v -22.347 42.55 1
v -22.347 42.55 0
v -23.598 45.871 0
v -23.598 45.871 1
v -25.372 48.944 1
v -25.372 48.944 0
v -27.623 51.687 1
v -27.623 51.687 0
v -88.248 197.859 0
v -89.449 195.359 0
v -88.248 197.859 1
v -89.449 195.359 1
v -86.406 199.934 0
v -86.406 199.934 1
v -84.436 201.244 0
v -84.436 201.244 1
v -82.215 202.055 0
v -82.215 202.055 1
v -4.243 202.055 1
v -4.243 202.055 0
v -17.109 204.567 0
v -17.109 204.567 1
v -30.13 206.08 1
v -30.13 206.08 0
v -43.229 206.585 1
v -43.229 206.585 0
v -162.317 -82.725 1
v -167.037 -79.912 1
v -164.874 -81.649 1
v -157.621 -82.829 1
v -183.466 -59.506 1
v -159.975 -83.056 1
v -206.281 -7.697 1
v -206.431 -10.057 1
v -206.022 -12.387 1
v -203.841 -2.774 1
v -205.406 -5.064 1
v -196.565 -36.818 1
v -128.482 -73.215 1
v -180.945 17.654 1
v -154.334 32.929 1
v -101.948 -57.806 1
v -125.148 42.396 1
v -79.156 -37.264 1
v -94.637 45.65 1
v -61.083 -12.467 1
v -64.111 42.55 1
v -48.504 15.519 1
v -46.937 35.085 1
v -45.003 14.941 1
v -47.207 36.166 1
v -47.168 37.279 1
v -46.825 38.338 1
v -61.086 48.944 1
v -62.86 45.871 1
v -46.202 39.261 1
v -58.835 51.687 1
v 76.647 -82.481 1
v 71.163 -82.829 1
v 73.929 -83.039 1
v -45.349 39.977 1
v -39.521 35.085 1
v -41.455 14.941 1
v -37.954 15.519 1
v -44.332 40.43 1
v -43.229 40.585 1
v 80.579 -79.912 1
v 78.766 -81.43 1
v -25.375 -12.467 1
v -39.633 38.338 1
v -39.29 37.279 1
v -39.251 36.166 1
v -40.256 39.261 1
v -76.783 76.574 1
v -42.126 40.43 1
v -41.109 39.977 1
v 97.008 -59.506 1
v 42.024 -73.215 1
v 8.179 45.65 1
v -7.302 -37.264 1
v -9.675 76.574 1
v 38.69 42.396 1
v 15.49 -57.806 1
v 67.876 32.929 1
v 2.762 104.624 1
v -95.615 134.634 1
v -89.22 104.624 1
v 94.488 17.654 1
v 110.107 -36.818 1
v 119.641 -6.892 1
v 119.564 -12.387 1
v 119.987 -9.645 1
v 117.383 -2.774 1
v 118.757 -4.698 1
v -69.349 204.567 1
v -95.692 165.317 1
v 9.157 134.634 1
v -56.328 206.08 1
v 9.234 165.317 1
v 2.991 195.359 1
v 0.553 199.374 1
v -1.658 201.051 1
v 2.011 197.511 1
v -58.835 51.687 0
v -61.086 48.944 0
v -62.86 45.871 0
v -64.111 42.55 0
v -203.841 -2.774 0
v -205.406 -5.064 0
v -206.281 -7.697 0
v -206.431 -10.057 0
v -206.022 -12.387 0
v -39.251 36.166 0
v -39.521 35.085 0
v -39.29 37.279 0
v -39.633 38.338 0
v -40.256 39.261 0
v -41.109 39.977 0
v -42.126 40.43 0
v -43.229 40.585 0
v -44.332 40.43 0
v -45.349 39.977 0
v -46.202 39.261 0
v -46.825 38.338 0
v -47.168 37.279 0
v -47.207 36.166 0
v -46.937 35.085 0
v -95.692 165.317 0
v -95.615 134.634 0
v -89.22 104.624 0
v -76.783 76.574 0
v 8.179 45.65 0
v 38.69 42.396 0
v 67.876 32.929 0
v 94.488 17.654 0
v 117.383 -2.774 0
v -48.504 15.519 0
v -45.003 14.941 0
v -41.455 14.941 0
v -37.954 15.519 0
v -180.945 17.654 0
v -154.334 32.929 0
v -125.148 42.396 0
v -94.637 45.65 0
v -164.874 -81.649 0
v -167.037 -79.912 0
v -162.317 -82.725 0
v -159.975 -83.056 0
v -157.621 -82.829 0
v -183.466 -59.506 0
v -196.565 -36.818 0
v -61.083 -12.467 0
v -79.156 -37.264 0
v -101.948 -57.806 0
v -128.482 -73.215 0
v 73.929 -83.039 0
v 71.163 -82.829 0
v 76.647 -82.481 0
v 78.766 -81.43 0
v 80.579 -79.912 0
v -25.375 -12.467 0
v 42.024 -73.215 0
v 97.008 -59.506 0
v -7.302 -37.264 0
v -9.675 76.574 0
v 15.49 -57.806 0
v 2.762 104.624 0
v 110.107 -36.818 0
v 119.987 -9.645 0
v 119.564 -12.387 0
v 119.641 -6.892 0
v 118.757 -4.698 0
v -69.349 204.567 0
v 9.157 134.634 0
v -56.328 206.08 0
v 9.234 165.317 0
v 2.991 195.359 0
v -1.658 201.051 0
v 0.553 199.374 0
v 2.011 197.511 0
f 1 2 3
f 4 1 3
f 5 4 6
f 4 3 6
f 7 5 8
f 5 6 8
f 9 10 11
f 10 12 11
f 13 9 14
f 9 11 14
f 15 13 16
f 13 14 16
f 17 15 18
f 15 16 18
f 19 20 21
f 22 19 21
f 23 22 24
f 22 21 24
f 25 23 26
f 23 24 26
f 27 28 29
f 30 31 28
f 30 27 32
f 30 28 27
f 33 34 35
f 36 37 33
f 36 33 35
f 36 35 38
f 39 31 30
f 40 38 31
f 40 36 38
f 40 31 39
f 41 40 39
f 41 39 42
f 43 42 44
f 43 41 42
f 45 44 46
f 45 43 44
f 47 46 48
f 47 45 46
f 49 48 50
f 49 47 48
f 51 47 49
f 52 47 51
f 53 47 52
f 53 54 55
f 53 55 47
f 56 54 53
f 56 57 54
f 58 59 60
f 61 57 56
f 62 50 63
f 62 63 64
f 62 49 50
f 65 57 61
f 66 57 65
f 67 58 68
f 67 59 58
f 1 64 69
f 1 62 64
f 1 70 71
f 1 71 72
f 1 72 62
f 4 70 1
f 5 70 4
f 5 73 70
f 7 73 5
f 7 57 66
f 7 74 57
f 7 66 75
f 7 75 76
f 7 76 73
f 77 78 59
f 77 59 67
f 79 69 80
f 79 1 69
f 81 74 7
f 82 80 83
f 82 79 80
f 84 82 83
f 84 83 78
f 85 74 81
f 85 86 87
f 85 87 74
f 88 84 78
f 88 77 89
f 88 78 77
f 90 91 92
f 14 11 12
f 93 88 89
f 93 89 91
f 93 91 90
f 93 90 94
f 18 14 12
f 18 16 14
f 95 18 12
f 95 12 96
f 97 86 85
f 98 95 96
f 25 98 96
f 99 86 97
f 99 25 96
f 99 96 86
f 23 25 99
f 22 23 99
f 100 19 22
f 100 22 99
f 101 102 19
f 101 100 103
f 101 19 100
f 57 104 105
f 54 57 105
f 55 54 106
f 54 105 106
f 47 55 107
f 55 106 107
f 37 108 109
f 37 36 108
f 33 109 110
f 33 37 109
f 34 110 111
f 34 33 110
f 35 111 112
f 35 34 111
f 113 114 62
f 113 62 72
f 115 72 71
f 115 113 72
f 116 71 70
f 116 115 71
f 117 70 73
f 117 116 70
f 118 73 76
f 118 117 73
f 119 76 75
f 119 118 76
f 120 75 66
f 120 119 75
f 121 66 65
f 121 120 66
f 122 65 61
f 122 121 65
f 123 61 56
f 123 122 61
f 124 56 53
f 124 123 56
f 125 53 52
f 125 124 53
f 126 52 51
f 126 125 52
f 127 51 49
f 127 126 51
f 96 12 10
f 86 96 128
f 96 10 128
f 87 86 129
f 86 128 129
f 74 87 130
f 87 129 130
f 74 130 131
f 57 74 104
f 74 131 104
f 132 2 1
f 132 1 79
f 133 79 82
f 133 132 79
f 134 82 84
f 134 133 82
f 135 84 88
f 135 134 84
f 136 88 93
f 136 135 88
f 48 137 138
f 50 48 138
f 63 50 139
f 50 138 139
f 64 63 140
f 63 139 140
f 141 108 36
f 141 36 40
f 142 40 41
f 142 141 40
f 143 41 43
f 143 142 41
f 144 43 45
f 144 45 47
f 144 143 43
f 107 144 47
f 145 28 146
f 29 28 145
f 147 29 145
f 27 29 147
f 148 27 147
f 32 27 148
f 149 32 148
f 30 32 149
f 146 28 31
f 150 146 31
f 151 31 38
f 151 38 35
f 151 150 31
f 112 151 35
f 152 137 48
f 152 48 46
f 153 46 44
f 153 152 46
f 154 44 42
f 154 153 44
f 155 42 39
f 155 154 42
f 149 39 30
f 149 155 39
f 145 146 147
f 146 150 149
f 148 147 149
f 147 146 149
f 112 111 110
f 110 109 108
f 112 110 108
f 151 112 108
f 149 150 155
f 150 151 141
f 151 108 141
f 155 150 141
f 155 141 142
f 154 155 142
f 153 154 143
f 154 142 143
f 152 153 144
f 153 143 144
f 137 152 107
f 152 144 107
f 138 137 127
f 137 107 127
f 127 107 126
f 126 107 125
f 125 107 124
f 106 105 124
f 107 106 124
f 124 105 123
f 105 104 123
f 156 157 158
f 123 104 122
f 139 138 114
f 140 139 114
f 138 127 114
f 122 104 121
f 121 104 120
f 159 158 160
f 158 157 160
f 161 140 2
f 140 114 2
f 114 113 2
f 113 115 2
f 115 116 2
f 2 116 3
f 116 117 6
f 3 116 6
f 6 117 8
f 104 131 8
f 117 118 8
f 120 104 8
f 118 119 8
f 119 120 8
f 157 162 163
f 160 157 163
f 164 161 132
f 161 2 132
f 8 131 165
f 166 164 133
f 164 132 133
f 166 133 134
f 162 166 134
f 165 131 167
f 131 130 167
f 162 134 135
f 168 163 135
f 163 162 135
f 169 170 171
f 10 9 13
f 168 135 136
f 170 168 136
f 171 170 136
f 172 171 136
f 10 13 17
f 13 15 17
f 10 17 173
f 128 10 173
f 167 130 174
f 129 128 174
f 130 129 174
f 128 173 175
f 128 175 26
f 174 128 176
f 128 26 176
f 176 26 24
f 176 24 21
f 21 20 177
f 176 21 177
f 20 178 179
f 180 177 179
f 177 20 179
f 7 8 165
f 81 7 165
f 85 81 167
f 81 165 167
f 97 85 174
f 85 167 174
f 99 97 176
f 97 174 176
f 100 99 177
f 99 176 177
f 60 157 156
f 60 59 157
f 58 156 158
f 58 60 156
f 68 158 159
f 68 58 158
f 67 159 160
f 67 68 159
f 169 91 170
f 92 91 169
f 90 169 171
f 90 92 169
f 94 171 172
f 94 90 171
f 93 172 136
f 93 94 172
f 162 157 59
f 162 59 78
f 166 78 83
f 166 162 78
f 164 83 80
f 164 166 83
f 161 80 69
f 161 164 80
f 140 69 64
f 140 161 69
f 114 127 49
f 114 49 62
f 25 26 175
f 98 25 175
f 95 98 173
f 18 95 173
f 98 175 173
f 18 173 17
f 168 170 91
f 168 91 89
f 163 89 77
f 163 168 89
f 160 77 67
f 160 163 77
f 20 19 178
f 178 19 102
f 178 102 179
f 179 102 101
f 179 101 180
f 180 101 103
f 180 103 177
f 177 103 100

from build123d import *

# Parameters (mm, degrees)
ESQUISSE2_R             = 21.716757685
BOSS_EXTRU_1_DEPTH      = 1
ENL_V_MAT_EXTRU_2_DEPTH = 293.837814183
CONG_2_R                = 10


with BuildPart() as part:
    # Esquisse2 → Boss.-Extru.1 (new body)
    with BuildSketch(Plane.XY):
        with Locations((-43.22899501, 36.585487108)):
            Circle(ESQUISSE2_R)
        with BuildLine():
            ThreePointArc((-207.546192285, -7.001881243), (-132.259115873, 40.696309579), (-43.22899501, 36.585487108))
            ThreePointArc((-43.22899501, 36.585487108), (-84.183978752, -42.572270496), (-163.135361924, -83.923695834))
            ThreePointArc((-163.135361924, -83.923695834), (-190.453313653, -48.414512892), (-207.546192285, -7.001881243))
        make_face()
        with BuildLine():
            ThreePointArc((76.677371904, -83.923695834), (-2.274011269, -42.572270496), (-43.22899501, 36.585487108))
            ThreePointArc((-43.22899501, 36.585487108), (45.801125853, 40.696309579), (121.088202265, -7.001881243))
            ThreePointArc((121.088202265, -7.001881243), (103.995323633, -48.414512892), (76.677371904, -83.923695834))
        make_face()
        with BuildLine():
            Line((-43.22899501, 206.585487108), (-43.22899501, 58.302244794))
            ThreePointArc((-43.22899501, 58.302244794), (-34.753748483, 56.580180421), (-27.622617897, 51.687094896))
            ThreePointArc((-27.622617897, 51.687094896), (7.298277527, 122.217794206), (1.181835351, 200.682038403))
            ThreePointArc((1.181835351, 200.682038403), (-20.82825529, 205.103162324), (-43.22899501, 206.585487108))
        make_face()
        with BuildLine():
            ThreePointArc((-58.835372123, 51.687094896), (-51.704241537, 56.580180421), (-43.22899501, 58.302244794))
            Line((-43.22899501, 58.302244794), (-43.22899501, 206.585487108))
            ThreePointArc((-43.22899501, 206.585487108), (-65.62973473, 205.103162324), (-87.639825371, 200.682038403))
            ThreePointArc((-87.639825371, 200.682038403), (-93.756267547, 122.217794206), (-58.835372123, 51.687094896))
        make_face()
        with BuildLine():
            ThreePointArc((-48.504182436, 15.519164174), (-45.480177087, 25.955564863), (-43.22899501, 36.585487108))
            ThreePointArc((-43.22899501, 36.585487108), (-53.560368754, 39.950867364), (-64.110559549, 42.550202255))
            ThreePointArc((-64.110559549, 42.550202255), (-62.036258854, 25.727108266), (-48.504182436, 15.519164174))
        make_face()
        with BuildLine():
            ThreePointArc((-22.347430471, 42.550202255), (-32.897621267, 39.950867364), (-43.22899501, 36.585487108))
            ThreePointArc((-43.22899501, 36.585487108), (-40.977812933, 25.955564863), (-37.953807584, 15.519164174))
            ThreePointArc((-37.953807584, 15.519164174), (-26.109159563, 23.224020174), (-21.512237325, 36.585487108))
            ThreePointArc((-21.512237325, 36.585487108), (-21.722049137, 39.596939182), (-22.347430471, 42.550202255))
        make_face()
        with BuildLine():
            ThreePointArc((-37.953807584, 15.519164174), (-40.977812933, 25.955564863), (-43.22899501, 36.585487108))
            ThreePointArc((-43.22899501, 36.585487108), (-45.480177087, 25.955564863), (-48.504182436, 15.519164174))
            ThreePointArc((-48.504182436, 15.519164174), (-43.22899501, 14.868729423), (-37.953807584, 15.519164174))
        make_face()
        with BuildLine():
            ThreePointArc((-64.110559549, 42.550202255), (-53.560368754, 39.950867364), (-43.22899501, 36.585487108))
            ThreePointArc((-43.22899501, 36.585487108), (-51.309186676, 43.850029099), (-58.835372123, 51.687094896))
            ThreePointArc((-58.835372123, 51.687094896), (-62.036258854, 47.443865951), (-64.110559549, 42.550202255))
        make_face()
        with BuildLine():
            ThreePointArc((-58.835372123, 51.687094896), (-51.309186676, 43.850029099), (-43.22899501, 36.585487108))
            Line((-43.22899501, 36.585487108), (-43.22899501, 58.302244794))
            ThreePointArc((-43.22899501, 58.302244794), (-51.704241537, 56.580180421), (-58.835372123, 51.687094896))
        make_face()
        with BuildLine():
            Line((-43.22899501, 58.302244794), (-43.22899501, 36.585487108))
            ThreePointArc((-43.22899501, 36.585487108), (-35.148803344, 43.850029099), (-27.622617897, 51.687094896))
            ThreePointArc((-27.622617897, 51.687094896), (-34.753748483, 56.580180421), (-43.22899501, 58.302244794))
        make_face()
        with BuildLine():
            ThreePointArc((-27.622617897, 51.687094896), (-35.148803344, 43.850029099), (-43.22899501, 36.585487108))
            ThreePointArc((-43.22899501, 36.585487108), (-32.897621267, 39.950867364), (-22.347430471, 42.550202255))
            ThreePointArc((-22.347430471, 42.550202255), (-24.421731167, 47.443865951), (-27.622617897, 51.687094896))
        make_face()
    extrude(amount=BOSS_EXTRU_1_DEPTH)

    # Esquisse4 → Enlèv. mat.-Extru.2 (cut, through all)
    with BuildSketch(Plane(origin=(0, 0, 0), x_dir=(-1, 0, 0), z_dir=(0, 0, -1))):
        with BuildLine():
            Line((46.937094254, 35.085487108), (39.520895767, 35.085487108))
            ThreePointArc((39.520895767, 35.085487108), (43.22899501, 40.585487108), (46.937094254, 35.085487108))
        make_face()
    extrude(amount=-ENL_V_MAT_EXTRU_2_DEPTH, mode=Mode.SUBTRACT)

    # Congé2
    cong_2_edges = [part.edges().sort_by_distance(p)[0] for p in [
        (-87.639825371, 200.682038403, 0.5),
        (1.181835351, 200.682038403, 0.5),
        (121.088202265, -7.001881243, 0.5),
        (76.677371904, -83.923695834, 0.5),
        (-163.135361924, -83.923695834, 0.5),
        (-207.546192285, -7.001881243, 0.5),
    ]]
    fillet(cong_2_edges, radius=CONG_2_R)


solid = part.part
